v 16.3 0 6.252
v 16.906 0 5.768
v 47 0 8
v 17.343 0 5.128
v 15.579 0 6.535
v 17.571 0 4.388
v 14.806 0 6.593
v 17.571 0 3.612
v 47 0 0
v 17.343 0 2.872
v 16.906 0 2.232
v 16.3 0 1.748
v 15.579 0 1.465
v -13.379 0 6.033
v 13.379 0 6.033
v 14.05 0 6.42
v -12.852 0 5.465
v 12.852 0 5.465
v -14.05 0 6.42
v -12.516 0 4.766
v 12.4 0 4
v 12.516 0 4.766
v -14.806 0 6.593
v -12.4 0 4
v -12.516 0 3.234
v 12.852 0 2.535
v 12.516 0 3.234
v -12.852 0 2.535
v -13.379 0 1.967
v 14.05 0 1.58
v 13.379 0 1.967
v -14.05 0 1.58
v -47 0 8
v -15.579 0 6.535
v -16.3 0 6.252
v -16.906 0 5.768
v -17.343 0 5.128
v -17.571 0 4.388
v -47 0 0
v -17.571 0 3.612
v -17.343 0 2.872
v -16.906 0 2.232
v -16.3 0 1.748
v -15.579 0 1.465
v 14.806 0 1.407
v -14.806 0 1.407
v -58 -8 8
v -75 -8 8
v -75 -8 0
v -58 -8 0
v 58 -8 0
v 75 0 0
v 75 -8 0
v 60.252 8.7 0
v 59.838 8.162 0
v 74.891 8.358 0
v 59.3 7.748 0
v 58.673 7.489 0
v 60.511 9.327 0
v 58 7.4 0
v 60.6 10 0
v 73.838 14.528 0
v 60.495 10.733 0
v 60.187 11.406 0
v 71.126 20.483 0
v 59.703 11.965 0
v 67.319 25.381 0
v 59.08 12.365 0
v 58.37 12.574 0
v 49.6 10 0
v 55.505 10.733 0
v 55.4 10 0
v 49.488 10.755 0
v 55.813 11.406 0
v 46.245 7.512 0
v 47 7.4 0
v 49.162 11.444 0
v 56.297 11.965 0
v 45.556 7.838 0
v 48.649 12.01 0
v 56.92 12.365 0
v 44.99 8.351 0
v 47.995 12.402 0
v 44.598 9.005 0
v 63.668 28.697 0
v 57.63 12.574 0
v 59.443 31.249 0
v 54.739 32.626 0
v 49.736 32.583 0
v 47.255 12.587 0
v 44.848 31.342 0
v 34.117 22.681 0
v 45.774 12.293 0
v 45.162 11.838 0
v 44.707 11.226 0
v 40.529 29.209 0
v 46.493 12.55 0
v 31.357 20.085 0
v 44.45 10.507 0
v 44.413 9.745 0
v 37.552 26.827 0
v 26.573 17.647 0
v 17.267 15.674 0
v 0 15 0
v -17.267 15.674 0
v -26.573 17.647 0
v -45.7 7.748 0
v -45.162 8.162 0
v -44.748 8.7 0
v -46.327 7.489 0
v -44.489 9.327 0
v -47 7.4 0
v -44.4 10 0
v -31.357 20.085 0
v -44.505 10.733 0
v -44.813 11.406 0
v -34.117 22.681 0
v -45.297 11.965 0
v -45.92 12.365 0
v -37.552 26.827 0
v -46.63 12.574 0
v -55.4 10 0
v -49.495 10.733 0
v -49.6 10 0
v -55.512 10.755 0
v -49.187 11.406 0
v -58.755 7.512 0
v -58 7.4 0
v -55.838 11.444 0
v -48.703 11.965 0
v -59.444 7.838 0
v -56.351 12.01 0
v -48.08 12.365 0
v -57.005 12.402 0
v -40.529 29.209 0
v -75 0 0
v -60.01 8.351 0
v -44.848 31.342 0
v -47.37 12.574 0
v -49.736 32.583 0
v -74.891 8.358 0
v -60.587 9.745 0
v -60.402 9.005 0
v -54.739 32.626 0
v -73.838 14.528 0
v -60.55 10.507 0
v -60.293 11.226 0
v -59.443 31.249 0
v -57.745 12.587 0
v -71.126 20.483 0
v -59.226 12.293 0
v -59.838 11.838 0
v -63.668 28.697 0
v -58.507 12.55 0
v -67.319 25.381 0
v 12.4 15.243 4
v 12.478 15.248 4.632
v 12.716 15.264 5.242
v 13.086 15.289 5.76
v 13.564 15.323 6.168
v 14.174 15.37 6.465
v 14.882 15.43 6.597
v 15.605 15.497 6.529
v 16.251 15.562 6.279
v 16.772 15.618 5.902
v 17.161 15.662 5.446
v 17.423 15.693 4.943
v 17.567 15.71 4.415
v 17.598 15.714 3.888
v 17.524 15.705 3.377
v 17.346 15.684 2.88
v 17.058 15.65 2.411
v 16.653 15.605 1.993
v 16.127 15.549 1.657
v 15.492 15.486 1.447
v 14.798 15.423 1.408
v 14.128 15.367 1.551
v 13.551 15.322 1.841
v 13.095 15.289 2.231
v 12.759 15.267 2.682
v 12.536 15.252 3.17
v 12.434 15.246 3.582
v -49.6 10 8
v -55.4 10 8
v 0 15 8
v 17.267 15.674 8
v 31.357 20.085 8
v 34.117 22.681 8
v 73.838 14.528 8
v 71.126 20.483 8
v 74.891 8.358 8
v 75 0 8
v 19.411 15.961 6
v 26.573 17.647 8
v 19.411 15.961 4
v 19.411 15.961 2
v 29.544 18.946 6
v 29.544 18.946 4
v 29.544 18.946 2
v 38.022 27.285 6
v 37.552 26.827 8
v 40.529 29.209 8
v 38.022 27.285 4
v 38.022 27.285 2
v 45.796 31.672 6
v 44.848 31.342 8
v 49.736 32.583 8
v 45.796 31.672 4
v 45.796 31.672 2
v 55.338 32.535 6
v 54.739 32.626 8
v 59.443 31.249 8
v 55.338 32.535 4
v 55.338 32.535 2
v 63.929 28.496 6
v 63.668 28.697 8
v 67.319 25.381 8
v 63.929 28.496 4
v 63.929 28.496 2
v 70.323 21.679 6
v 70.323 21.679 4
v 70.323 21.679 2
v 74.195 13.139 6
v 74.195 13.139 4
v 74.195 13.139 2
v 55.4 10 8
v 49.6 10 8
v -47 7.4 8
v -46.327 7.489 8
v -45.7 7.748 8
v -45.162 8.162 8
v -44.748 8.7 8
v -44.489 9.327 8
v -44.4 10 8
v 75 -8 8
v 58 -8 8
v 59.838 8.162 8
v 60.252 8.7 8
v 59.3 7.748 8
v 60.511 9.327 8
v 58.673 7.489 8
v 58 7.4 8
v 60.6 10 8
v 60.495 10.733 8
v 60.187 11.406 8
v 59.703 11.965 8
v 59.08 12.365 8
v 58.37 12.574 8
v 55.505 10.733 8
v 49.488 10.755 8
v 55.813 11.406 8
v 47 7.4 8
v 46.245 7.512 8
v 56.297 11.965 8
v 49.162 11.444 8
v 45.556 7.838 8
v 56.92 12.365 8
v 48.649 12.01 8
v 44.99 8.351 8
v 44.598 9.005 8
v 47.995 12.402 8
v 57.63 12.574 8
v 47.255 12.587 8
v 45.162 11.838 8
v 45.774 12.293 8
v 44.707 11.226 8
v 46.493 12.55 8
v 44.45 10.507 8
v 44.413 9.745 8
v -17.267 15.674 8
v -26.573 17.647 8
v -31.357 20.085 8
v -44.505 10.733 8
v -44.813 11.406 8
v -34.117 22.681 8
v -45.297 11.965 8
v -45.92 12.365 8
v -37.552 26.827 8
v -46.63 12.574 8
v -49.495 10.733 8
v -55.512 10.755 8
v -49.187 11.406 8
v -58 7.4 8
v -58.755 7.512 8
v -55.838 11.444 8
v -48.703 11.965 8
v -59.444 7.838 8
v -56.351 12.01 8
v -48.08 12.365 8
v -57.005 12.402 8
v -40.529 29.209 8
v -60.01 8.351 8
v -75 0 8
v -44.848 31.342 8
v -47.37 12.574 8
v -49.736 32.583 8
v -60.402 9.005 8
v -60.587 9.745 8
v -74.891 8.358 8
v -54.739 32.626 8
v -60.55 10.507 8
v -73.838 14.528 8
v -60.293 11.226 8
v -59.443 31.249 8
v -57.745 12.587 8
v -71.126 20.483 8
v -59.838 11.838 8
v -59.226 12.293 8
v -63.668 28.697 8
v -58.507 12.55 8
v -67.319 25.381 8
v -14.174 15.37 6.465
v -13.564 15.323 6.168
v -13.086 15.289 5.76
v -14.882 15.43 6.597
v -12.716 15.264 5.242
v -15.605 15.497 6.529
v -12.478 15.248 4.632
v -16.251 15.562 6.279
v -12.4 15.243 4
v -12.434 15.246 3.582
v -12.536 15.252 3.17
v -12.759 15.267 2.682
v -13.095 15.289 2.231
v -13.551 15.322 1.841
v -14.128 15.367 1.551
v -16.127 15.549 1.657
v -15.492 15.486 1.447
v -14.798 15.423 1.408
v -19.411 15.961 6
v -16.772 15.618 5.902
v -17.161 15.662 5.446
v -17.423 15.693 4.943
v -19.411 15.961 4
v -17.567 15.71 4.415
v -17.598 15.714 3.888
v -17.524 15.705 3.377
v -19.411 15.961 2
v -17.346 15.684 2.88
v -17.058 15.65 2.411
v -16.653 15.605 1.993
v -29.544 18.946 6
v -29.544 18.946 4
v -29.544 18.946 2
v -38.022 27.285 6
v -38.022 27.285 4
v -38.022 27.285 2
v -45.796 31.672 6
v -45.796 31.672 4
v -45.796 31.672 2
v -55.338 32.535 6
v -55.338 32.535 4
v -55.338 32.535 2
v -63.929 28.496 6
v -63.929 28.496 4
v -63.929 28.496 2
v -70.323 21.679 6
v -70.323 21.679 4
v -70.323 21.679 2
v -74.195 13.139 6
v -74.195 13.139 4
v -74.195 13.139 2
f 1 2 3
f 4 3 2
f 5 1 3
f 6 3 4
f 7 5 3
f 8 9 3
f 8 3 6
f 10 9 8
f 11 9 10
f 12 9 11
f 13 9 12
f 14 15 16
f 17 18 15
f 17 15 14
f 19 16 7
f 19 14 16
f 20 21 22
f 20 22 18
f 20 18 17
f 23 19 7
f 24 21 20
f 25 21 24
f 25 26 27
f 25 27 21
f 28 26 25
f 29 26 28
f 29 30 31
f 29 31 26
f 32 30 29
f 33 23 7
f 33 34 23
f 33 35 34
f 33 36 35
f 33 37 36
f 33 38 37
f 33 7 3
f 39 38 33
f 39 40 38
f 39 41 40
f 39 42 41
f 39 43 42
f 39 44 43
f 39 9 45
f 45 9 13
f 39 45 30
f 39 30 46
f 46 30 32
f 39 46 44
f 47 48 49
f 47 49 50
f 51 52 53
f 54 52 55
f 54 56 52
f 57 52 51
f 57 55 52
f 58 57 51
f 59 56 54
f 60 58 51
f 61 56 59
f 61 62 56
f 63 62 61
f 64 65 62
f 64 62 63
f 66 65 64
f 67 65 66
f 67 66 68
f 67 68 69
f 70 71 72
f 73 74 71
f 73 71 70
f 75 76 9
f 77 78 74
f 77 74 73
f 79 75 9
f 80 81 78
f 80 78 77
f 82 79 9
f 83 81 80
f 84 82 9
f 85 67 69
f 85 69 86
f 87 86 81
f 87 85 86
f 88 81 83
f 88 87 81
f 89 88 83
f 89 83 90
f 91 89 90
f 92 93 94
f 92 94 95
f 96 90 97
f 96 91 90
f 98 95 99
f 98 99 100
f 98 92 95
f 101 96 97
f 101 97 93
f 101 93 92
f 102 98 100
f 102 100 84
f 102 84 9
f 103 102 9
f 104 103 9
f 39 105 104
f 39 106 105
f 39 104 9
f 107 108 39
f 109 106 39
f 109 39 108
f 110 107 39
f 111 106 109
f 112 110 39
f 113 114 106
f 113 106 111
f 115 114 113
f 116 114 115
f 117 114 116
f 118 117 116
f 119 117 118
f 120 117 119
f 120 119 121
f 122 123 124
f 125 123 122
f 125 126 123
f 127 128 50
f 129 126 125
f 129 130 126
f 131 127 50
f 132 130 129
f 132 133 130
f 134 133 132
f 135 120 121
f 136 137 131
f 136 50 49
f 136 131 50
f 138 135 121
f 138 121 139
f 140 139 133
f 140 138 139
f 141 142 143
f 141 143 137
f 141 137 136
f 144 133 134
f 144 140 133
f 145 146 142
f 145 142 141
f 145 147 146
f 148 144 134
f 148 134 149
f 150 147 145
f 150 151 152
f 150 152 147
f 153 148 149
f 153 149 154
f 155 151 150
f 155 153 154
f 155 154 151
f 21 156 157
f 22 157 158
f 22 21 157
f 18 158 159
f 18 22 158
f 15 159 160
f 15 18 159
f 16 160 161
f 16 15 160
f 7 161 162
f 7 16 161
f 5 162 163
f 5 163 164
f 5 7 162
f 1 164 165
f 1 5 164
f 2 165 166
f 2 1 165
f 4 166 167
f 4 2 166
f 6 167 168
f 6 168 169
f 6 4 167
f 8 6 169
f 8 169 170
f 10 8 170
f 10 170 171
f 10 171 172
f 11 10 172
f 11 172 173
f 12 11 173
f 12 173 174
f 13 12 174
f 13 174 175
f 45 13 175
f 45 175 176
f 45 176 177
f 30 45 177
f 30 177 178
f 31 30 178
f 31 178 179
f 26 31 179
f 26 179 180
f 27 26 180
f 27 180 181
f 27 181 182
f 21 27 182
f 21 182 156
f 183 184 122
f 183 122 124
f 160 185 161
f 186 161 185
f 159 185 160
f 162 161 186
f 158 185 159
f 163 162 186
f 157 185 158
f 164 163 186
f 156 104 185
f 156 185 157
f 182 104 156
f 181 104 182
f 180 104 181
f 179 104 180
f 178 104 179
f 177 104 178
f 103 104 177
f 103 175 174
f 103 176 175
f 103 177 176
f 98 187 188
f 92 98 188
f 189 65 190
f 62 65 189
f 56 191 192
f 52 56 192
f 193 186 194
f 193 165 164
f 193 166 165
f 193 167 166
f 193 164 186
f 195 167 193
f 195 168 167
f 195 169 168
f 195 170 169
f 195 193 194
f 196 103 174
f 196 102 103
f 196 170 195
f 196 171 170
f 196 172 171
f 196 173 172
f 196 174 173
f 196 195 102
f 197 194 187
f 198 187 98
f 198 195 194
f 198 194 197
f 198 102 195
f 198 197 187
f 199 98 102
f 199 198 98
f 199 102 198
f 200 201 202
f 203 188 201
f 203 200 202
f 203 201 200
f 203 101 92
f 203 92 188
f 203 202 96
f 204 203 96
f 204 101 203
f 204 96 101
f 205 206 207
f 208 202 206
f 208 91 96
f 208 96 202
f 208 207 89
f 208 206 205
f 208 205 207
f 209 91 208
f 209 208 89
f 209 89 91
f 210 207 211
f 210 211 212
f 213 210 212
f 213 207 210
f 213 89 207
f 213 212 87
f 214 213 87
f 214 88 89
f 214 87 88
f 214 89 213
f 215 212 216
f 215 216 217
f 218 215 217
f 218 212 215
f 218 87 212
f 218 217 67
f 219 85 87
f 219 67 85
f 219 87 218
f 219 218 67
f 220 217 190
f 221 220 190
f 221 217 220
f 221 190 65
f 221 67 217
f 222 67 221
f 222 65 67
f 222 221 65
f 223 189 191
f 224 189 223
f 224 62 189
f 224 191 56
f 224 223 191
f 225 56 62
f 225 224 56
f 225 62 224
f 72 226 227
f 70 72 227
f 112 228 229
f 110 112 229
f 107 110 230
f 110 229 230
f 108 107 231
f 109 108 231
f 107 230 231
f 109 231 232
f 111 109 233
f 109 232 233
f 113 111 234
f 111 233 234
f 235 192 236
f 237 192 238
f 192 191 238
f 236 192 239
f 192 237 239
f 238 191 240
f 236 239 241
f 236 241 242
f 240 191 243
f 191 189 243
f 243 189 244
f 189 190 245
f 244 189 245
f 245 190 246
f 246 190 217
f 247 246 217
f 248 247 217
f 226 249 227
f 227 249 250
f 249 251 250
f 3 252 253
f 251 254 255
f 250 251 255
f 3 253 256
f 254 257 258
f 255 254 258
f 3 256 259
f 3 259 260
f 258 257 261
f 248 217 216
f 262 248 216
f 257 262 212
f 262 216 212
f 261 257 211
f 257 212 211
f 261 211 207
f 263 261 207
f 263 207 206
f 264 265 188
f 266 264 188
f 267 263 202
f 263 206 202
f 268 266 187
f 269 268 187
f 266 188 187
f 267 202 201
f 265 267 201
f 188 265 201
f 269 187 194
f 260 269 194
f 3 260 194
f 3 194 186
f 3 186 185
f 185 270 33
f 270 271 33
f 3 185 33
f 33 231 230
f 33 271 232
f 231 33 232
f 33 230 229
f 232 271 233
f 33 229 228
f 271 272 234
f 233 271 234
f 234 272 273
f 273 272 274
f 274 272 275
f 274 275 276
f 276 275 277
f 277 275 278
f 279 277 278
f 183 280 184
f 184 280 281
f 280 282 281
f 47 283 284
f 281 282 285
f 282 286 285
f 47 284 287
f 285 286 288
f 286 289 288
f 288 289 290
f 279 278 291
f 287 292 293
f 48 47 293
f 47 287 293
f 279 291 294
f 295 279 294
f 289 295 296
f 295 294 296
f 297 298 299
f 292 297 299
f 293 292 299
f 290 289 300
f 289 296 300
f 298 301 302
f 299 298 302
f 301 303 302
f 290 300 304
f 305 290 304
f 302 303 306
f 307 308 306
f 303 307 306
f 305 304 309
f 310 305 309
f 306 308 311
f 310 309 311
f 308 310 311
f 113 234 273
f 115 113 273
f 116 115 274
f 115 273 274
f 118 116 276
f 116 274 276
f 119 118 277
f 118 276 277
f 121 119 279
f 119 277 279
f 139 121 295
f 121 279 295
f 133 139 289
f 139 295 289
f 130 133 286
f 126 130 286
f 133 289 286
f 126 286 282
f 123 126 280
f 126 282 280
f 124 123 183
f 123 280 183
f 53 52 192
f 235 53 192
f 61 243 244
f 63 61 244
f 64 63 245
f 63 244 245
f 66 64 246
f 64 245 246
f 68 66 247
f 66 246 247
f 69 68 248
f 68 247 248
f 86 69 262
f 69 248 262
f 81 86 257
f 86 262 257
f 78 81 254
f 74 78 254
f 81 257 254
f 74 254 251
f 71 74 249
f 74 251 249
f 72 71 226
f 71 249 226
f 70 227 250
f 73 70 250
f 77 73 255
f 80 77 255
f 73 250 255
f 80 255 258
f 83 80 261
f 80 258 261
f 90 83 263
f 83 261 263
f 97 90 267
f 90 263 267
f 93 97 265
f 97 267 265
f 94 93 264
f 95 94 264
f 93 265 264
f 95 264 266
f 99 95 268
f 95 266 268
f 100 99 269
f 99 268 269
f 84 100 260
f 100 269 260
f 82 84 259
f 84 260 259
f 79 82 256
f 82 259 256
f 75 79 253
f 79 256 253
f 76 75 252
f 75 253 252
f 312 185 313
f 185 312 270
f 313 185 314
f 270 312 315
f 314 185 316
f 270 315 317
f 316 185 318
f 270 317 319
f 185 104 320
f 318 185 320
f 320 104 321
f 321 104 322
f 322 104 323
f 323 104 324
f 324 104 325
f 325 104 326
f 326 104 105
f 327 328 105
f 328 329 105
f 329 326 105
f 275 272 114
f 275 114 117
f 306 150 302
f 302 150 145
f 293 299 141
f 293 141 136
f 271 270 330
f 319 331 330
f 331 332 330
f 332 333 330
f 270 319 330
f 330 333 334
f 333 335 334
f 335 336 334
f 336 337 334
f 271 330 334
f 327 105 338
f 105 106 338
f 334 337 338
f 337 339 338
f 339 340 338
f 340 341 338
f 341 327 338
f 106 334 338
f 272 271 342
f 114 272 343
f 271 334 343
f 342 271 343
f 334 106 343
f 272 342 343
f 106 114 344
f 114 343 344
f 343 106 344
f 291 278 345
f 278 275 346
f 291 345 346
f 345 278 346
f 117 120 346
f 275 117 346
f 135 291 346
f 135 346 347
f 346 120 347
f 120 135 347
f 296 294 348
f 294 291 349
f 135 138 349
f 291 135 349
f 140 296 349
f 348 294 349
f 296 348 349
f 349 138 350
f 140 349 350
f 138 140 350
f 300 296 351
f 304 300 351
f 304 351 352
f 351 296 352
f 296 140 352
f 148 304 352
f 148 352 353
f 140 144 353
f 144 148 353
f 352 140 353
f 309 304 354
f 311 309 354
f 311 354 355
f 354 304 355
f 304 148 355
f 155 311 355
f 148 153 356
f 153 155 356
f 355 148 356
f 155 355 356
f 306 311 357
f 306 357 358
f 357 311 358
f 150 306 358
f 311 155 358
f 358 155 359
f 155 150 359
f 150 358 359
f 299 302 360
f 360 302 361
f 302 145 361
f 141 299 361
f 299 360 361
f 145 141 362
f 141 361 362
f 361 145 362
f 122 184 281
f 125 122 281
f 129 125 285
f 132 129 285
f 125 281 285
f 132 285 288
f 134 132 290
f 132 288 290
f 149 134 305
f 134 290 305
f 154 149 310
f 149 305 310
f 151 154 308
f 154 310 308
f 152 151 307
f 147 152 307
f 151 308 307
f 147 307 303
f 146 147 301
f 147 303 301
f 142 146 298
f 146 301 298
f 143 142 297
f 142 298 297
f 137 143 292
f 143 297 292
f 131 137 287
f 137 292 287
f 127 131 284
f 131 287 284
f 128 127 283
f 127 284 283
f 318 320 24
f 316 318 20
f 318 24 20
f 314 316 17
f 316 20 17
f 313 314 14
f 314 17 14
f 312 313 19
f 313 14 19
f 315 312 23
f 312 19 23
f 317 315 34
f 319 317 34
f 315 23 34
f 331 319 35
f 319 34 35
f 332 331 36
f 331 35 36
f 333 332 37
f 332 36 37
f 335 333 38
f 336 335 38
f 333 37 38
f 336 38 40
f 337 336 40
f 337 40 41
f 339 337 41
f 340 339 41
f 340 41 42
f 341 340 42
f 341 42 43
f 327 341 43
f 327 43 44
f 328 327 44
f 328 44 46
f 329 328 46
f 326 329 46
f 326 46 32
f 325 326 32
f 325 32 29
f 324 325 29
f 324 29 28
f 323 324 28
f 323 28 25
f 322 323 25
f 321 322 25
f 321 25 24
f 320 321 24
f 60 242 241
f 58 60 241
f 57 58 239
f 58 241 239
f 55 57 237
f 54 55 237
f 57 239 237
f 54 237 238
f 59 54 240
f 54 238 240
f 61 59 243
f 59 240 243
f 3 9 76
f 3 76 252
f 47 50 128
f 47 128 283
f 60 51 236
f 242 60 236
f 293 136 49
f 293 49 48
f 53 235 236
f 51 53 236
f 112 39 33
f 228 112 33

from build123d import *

# Parameters (mm, degrees)
F1_DEPTH  = 8
F2_R      = 2.6
F3_DEPTH  = 32.7754338425
F4_W      = 17
F4_H      = 8
F5_DEPTH  = 8
F6_W      = 11
F6_H      = 8
F7_DEPTH  = 10
F10_DEPTH = 8.0010001


# Not quite as in the source:
# - a feature names something its author has since deleted; it is built from what else it names


with BuildPart() as f1:
    # F0 (on Top) → F1 (new body)
    with BuildSketch(Plane.XY):
        with BuildLine():
            Line((-75, 0), (0, 0))
            Line((0, 0), (0, 15))
            add(Edge.make_bspline(
                [(0, 15), (-33.8492020965, 14.5203908905), (-31.1904909634, 26.878043416), (-56.3916650053, 36.3544882745), (-72.7604456377, 21.0379339388), (-75.3937876263, 11.3815652157), (-75, 0)],
                knots=[0, 0, 0, 0, 0.3227401515, 0.539922816, 0.7595547121, 1, 1, 1, 1], degree=3))
        make_face()
    extrude(amount=F1_DEPTH)

    # F2 (on face) → F3 (cut, through all)
    with BuildSketch(Plane.XZ):
        with Locations((-15, 4)):
            Circle(F2_R)
        with Locations((15, 4)):
            Circle(F2_R)
    extrude(amount=-F3_DEPTH, mode=Mode.SUBTRACT)

    # F4 (on face) → F5 (join)
    with BuildSketch(Plane.XZ):
        with Locations((-66.5, 4)):
            Rectangle(F4_W, F4_H)
    extrude(amount=F5_DEPTH)

    # F6 (on face) → F7 (cut)
    with BuildSketch(Plane.XZ):
        with Locations((-52.5, 4)):
            Rectangle(F6_W, F6_H)
    extrude(amount=-F7_DEPTH, mode=Mode.SUBTRACT)

    # F8: F1 across face


with BuildPart() as f1_1:
    add(f1.part)
    add(f1.part.mirror(Plane(origin=(0, 7.5, 4), x_dir=(0, 1, 0), z_dir=(1, 0, 0))))

    # F9 (on face) → F10 (cut, through all)
    with BuildSketch(Plane.XY.offset(8)):
        with BuildLine():
            ThreePointArc((58, 7.4), (59.8384776311, 8.1615223689), (60.6, 10))
            ThreePointArc((60.6, 10), (58, 12.6), (55.4, 10))
            Line((55.4, 10), (58, 10))
            Line((58, 10), (58, 7.4))
        make_face()
        with BuildLine():
            Line((47, 10), (49.6, 10))
            ThreePointArc((49.6, 10), (45.1615223689, 11.8384776311), (47, 7.4))
            Line((47, 7.4), (47, 10))
        make_face()
        with BuildLine():
            Line((-47, 10), (-47, 7.4))
            ThreePointArc((-47, 7.4), (-45.1615223689, 8.1615223689), (-44.4, 10))
            ThreePointArc((-44.4, 10), (-47, 12.6), (-49.6, 10))
            Line((-49.6, 10), (-47, 10))
        make_face()
        with BuildLine():
            Line((-58, 10), (-55.4, 10))
            ThreePointArc((-55.4, 10), (-59.8384776311, 11.8384776311), (-58, 7.4))
            Line((-58, 7.4), (-58, 10))
        make_face()
    extrude(amount=-F10_DEPTH, mode=Mode.SUBTRACT)


solid = f1_1.part
